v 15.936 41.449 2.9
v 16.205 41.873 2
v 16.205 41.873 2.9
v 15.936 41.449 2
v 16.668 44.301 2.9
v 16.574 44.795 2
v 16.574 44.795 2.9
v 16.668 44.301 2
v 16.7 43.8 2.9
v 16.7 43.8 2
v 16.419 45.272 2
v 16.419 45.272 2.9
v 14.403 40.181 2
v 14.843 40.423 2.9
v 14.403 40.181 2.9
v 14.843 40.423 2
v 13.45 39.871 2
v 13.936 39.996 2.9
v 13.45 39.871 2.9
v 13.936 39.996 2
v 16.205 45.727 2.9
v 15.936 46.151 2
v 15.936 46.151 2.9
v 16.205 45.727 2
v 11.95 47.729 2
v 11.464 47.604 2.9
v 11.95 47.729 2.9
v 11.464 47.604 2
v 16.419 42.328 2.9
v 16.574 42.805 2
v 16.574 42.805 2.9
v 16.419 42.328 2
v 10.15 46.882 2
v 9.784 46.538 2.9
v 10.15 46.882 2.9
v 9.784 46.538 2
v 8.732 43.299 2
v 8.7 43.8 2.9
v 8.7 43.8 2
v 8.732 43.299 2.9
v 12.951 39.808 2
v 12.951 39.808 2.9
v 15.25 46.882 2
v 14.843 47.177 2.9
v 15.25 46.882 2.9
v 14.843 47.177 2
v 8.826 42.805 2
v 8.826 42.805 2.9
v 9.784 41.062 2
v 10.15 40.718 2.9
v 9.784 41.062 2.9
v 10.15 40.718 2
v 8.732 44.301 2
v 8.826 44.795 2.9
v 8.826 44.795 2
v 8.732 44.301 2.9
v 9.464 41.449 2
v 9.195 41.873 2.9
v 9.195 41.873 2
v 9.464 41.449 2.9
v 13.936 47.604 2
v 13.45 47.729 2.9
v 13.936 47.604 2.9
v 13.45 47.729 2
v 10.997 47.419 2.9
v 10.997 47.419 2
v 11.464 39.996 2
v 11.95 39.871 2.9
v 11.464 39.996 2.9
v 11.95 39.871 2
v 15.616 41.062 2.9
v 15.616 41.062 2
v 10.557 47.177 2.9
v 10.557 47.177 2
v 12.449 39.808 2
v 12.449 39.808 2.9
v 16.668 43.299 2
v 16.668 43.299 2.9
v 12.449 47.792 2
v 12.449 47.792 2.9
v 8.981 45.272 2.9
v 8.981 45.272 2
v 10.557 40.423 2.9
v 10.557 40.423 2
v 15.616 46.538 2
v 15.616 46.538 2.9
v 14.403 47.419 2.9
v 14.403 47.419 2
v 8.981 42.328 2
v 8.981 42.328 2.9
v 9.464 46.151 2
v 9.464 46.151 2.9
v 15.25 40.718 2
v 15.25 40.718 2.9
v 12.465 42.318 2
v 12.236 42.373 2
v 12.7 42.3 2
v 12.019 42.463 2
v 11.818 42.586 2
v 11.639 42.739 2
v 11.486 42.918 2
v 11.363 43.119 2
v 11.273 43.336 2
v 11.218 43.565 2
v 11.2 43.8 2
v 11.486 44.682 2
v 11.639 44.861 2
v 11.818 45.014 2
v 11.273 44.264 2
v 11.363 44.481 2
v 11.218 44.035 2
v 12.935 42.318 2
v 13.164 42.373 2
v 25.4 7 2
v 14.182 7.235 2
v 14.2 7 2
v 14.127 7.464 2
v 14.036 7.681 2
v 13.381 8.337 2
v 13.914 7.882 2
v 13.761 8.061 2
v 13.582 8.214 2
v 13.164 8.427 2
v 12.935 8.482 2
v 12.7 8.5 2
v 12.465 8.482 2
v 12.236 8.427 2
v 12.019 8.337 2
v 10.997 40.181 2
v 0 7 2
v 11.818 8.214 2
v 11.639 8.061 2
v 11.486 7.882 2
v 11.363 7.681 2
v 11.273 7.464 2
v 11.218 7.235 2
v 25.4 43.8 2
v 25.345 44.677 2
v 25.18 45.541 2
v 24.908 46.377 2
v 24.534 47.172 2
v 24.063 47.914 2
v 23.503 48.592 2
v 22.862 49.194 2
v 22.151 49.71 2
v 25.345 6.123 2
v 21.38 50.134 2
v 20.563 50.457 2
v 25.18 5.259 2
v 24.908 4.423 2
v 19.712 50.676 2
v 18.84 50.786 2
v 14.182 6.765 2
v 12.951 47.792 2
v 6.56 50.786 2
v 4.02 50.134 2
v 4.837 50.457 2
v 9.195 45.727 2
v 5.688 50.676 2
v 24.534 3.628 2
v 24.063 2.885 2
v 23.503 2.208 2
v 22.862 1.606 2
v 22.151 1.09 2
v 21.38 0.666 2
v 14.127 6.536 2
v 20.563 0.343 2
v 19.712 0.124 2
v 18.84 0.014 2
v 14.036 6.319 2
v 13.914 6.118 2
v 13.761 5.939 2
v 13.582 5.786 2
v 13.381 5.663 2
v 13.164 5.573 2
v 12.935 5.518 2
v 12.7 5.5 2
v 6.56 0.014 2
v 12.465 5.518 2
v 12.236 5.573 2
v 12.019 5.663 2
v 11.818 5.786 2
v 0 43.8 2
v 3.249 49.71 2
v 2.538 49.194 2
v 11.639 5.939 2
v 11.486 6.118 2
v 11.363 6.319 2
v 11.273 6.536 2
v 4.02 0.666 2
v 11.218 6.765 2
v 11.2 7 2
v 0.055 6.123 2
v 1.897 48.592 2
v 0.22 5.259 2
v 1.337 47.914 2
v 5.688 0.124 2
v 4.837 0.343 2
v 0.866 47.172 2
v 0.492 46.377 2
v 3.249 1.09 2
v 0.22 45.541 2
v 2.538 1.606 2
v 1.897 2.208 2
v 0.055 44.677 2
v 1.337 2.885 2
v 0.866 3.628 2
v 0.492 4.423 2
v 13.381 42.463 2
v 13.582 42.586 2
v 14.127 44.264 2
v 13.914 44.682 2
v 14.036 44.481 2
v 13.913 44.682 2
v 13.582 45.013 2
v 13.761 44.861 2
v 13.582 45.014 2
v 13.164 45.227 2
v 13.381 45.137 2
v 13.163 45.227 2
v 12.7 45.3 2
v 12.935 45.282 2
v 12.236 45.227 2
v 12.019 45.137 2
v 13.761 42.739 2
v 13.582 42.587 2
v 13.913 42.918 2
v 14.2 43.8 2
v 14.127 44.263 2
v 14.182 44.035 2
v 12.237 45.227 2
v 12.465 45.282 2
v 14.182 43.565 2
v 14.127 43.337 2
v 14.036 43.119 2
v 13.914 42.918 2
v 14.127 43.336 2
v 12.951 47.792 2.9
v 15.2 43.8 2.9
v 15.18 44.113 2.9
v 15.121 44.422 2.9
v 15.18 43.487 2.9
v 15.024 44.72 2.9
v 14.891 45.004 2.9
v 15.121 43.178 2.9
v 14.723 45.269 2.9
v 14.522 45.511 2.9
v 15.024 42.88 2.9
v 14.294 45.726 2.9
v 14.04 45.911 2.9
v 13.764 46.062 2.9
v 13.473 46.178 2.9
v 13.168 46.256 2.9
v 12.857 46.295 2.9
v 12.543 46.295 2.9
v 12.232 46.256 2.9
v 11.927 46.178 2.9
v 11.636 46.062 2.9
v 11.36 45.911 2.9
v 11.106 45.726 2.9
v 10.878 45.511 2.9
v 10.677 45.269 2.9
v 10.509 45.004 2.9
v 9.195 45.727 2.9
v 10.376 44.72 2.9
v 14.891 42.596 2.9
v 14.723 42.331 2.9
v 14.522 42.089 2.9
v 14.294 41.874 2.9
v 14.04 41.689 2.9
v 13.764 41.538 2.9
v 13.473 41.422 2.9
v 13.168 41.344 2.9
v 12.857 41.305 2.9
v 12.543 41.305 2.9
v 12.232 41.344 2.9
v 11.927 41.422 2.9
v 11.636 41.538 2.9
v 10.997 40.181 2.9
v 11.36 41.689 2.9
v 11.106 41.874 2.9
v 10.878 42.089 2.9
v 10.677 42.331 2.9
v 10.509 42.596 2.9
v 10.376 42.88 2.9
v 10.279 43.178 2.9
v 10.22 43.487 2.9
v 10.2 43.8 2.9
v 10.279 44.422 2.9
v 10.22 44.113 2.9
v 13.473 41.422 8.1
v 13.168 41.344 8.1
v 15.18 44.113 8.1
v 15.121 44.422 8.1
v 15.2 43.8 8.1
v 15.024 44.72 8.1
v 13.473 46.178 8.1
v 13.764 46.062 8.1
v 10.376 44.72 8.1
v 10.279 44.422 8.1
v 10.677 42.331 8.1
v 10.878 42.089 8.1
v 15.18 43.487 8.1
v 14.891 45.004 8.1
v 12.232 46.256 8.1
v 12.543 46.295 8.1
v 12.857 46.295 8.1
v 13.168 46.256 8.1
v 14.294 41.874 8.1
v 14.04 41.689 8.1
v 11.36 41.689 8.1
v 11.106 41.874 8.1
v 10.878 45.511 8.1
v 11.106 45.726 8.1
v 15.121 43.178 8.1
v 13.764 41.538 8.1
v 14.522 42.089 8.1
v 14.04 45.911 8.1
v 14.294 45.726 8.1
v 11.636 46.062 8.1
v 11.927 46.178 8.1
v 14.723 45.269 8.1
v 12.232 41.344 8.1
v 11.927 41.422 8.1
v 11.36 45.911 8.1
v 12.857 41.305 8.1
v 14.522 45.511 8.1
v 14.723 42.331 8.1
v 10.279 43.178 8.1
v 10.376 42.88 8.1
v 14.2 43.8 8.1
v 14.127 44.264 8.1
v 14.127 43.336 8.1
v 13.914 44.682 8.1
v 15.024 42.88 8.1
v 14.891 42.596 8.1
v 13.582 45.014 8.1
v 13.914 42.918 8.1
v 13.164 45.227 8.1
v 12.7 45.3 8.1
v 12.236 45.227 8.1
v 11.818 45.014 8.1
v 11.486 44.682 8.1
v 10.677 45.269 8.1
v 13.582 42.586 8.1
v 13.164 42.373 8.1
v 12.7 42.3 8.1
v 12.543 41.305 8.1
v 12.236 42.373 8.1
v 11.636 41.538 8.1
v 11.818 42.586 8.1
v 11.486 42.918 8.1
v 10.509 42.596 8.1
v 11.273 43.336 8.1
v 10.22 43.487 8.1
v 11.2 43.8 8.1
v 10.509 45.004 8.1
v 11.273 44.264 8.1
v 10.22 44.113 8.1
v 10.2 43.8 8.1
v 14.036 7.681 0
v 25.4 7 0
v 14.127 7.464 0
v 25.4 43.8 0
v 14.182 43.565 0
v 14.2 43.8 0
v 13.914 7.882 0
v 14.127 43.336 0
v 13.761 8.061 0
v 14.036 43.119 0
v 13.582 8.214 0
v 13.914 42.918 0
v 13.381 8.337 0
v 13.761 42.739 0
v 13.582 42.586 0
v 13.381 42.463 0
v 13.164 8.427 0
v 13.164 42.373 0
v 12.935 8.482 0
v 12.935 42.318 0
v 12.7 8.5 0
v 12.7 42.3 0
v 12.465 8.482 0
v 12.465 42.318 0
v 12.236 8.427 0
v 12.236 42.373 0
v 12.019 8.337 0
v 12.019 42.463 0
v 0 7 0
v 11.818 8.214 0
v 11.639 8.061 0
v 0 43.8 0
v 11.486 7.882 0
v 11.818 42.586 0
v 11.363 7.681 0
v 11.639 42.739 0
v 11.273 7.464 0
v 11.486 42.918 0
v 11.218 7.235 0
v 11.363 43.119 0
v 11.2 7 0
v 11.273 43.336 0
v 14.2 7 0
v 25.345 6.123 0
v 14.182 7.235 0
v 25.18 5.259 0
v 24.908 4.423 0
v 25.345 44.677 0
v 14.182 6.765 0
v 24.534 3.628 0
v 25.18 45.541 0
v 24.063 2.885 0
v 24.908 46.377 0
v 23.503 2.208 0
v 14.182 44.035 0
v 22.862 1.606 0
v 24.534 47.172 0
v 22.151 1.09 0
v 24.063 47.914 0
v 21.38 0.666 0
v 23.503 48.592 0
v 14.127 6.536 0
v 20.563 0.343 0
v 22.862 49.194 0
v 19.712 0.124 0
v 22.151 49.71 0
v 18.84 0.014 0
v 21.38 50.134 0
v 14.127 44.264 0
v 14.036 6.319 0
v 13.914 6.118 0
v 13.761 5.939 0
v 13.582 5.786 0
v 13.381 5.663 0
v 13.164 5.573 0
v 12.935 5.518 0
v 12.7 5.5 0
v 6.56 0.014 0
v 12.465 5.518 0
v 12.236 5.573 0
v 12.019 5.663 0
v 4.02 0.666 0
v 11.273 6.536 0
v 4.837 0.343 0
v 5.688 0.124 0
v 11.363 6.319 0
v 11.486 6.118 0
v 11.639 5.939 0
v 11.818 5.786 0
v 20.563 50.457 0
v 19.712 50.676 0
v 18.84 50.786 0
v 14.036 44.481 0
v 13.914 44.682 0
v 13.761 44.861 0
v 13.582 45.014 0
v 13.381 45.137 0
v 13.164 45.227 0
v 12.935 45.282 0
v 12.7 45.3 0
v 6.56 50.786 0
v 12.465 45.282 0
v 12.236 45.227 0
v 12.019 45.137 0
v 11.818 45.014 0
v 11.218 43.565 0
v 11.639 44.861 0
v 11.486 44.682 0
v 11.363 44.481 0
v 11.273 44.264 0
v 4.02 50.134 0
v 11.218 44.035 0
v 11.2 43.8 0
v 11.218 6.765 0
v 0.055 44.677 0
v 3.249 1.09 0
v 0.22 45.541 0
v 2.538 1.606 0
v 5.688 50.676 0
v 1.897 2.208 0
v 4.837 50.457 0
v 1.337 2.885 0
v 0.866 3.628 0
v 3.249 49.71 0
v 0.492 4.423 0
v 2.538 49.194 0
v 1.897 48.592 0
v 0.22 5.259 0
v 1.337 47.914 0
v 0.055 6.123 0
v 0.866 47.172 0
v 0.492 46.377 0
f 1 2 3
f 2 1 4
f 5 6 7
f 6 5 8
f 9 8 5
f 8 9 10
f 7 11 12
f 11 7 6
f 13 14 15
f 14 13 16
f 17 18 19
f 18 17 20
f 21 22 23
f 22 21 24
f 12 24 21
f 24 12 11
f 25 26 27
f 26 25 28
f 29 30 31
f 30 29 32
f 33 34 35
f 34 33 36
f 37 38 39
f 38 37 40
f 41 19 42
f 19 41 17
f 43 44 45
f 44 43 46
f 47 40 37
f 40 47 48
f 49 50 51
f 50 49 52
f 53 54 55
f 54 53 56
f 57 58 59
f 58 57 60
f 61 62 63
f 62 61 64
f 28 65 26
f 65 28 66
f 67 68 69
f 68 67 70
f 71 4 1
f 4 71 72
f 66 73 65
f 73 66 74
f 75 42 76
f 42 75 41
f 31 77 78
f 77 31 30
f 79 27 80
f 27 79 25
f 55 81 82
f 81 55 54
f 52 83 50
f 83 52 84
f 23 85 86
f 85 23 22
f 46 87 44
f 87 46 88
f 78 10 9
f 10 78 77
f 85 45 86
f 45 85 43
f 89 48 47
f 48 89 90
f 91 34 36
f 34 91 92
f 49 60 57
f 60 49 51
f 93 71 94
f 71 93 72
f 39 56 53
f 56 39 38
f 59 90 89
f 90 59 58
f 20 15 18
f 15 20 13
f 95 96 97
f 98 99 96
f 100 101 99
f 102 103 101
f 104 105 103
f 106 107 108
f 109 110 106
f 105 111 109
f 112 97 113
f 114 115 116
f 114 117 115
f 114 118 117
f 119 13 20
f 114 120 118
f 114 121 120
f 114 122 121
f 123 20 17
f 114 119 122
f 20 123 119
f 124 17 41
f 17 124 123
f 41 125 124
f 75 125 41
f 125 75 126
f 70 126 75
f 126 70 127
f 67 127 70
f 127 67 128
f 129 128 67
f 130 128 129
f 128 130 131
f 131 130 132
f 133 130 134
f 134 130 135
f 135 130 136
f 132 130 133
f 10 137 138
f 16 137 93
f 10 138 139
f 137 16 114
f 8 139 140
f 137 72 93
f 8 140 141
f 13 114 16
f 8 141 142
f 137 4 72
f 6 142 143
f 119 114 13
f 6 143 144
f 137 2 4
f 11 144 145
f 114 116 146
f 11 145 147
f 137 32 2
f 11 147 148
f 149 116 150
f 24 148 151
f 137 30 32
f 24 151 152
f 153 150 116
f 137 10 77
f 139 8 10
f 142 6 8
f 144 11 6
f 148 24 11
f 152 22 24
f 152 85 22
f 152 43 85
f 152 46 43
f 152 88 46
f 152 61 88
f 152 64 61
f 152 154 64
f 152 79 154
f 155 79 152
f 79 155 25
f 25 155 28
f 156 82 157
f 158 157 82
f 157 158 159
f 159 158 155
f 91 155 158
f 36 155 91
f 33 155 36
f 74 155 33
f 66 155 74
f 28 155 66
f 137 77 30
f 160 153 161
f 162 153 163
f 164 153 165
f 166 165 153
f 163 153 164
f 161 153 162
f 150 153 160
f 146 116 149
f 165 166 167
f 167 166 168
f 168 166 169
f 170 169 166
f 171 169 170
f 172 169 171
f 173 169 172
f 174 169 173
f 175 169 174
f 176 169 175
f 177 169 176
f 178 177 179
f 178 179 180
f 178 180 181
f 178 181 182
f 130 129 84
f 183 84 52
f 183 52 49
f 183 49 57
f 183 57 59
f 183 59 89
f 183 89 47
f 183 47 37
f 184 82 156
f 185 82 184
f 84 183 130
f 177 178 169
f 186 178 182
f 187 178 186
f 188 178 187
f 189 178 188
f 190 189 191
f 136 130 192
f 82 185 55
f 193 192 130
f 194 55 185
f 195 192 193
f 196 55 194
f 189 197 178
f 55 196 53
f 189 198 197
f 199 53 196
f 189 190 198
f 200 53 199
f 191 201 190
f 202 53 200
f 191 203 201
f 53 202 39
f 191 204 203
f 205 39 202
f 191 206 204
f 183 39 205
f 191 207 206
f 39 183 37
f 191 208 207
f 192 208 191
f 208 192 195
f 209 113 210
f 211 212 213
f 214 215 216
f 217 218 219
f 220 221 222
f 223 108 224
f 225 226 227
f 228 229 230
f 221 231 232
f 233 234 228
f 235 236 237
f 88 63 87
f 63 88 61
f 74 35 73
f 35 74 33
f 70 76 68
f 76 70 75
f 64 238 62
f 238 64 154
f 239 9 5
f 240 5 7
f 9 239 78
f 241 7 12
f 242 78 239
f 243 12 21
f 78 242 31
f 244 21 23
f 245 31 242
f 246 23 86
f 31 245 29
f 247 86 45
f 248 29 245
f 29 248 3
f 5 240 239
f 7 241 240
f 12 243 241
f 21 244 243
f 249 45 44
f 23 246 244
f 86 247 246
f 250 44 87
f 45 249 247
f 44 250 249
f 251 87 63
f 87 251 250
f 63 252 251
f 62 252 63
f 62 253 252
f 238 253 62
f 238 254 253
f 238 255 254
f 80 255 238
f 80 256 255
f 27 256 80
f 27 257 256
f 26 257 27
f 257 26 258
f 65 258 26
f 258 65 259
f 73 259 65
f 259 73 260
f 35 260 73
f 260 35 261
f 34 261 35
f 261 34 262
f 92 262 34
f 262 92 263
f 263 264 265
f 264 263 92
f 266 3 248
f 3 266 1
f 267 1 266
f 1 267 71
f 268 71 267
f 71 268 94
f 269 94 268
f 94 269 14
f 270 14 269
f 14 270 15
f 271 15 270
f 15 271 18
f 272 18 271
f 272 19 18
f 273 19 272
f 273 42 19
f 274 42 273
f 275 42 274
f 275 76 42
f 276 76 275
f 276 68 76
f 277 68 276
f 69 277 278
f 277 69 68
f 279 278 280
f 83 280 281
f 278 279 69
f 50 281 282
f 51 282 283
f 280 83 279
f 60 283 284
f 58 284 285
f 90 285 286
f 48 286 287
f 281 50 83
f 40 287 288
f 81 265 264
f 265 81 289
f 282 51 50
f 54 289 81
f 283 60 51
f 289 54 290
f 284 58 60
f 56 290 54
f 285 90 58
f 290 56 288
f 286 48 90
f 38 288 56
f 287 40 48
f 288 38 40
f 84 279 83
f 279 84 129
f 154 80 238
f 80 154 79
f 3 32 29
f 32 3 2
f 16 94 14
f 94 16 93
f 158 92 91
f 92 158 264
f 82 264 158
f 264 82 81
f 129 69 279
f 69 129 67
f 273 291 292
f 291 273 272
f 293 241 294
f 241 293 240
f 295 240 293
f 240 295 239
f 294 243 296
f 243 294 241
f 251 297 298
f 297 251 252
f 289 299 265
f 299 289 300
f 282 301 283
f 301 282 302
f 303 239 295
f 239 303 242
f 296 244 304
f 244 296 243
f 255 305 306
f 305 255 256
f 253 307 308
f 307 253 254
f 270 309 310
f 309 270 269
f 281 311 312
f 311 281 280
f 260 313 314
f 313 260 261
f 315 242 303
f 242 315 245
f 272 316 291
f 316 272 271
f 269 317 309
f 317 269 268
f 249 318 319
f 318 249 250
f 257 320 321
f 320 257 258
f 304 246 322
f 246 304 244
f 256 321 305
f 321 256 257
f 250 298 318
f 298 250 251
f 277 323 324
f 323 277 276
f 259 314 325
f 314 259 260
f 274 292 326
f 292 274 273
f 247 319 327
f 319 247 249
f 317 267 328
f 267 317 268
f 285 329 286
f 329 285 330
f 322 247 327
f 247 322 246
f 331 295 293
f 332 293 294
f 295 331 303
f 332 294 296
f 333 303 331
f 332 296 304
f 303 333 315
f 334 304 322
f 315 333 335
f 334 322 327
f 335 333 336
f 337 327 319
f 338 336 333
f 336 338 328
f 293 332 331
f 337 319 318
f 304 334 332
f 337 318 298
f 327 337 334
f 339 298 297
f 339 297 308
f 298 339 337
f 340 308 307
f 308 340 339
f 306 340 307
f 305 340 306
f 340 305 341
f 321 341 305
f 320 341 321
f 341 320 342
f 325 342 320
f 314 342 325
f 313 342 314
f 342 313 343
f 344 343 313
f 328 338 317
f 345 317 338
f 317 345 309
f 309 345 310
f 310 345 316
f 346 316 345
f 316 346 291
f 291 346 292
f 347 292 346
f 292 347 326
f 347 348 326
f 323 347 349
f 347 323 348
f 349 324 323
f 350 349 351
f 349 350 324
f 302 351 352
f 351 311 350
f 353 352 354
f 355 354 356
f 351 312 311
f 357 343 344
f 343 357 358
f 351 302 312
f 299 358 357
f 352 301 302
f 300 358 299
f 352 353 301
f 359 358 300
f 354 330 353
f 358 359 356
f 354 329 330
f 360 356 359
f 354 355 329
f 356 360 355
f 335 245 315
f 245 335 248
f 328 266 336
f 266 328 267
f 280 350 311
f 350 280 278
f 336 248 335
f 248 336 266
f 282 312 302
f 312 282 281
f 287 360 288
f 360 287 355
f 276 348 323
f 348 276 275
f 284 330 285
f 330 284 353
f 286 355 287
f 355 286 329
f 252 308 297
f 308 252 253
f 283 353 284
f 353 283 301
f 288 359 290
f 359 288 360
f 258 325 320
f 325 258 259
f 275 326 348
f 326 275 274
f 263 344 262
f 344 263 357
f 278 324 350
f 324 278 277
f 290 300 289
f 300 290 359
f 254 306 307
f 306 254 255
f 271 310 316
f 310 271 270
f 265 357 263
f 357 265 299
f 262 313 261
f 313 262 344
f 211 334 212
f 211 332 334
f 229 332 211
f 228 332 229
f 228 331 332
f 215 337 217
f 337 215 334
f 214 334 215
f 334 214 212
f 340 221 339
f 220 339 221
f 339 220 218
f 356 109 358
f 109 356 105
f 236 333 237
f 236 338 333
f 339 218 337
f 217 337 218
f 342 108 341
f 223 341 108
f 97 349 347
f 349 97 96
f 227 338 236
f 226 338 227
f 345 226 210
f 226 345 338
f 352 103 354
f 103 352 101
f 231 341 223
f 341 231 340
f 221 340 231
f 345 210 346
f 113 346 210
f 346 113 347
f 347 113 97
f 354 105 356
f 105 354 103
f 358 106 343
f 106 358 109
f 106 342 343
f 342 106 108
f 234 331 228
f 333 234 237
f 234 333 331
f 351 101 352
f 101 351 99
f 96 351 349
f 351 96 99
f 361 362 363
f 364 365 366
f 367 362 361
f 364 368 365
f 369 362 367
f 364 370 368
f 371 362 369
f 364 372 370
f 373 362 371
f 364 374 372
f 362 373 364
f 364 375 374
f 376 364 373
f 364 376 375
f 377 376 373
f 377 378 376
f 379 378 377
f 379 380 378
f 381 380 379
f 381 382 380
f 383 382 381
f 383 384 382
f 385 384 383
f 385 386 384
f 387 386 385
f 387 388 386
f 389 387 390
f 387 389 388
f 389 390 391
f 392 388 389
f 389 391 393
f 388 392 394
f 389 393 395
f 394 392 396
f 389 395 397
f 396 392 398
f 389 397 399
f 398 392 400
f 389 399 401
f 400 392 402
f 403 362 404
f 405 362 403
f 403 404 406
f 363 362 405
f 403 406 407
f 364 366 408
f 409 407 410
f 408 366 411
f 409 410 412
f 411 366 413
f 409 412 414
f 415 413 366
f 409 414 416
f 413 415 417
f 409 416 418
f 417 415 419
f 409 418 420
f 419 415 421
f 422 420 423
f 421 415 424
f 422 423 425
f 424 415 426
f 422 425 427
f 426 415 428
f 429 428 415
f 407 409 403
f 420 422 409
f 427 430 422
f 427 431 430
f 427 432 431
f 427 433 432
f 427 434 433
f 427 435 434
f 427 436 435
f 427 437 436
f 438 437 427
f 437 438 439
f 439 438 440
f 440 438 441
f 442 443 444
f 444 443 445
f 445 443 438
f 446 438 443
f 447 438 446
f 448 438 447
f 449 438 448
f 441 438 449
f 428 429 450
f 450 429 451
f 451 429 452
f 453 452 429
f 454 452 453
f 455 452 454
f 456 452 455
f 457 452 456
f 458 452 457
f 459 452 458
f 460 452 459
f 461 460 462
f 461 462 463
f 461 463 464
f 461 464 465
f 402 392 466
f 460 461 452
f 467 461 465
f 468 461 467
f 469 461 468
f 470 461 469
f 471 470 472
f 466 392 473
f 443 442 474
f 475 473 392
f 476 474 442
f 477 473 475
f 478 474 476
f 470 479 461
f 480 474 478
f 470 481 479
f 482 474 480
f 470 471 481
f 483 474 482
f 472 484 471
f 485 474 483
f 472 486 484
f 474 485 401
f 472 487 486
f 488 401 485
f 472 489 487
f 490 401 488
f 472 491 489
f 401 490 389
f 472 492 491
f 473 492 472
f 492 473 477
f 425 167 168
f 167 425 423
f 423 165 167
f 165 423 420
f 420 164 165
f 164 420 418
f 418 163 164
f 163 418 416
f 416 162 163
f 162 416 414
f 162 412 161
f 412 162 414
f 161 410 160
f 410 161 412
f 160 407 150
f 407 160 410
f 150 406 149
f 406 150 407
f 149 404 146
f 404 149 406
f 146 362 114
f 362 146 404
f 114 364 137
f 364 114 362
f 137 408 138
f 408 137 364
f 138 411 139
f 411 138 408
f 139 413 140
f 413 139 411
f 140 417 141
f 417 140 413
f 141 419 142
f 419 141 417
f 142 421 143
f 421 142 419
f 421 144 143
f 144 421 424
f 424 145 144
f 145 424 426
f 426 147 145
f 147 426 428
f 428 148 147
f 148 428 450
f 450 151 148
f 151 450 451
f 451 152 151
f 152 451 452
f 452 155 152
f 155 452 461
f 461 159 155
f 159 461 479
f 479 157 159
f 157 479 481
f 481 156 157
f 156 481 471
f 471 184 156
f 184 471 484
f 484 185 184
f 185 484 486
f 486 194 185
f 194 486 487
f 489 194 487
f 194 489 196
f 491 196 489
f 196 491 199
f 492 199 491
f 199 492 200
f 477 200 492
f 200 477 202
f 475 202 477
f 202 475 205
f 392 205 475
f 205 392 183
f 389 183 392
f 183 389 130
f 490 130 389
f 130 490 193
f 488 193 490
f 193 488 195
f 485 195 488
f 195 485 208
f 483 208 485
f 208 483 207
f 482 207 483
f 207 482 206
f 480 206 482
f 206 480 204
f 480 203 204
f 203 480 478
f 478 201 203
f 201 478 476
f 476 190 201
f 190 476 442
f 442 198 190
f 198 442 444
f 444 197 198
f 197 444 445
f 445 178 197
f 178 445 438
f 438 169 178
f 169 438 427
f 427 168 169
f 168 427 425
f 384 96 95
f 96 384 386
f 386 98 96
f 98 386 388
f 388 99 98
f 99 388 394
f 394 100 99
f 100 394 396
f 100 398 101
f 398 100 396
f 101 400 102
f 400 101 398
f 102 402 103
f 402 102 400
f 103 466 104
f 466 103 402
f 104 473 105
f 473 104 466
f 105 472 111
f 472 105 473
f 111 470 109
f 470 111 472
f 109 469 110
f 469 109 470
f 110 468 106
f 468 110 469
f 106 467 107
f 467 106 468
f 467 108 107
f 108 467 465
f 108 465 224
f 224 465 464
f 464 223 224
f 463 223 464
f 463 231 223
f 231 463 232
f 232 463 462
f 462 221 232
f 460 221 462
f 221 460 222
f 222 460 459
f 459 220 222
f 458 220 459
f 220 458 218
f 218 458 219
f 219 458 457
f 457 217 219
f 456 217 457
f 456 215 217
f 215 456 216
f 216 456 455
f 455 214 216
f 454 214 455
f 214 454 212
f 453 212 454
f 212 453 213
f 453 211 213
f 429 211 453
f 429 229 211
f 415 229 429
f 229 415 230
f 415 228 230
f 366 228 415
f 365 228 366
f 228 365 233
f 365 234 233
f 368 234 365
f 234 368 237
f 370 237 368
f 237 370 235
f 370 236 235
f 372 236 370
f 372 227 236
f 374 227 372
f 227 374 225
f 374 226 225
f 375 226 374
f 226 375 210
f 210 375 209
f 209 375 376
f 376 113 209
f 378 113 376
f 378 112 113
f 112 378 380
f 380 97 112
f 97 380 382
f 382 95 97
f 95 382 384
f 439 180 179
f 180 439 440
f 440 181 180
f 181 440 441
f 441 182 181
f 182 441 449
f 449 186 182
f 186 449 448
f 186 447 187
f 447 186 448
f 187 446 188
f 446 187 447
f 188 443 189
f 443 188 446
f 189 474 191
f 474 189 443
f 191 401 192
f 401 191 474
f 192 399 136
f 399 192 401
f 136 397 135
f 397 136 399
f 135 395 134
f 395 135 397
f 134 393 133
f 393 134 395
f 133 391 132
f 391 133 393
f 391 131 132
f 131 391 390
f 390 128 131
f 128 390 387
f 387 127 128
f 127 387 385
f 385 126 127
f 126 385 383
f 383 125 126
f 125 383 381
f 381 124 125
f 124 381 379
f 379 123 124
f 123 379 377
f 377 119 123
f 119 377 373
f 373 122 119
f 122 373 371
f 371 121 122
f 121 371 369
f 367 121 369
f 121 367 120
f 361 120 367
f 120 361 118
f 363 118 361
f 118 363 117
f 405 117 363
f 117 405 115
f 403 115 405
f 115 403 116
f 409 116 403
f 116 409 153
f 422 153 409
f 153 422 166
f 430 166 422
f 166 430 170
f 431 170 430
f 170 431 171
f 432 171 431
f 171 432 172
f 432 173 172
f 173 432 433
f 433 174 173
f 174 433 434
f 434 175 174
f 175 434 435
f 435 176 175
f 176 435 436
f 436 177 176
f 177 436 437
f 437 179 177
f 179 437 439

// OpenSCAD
*!difference() {
  cylinder(d1=14,d2=10.4,h=1.8,$fn=50);
  translate([0,0,-.01]) cylinder(d=8,h=10,$fn=50);
}
maxx=inches(1);
maxy=inches(2);
bearod=16;
bearid=5;
beart=5;
bearxo=(bearod-2)/2;
xpos=[maxx/2];
*translate([-20,maxy-22.5,-12.5]) difference() {
  cube([99,25.4,25.4]);
  translate([-.5,1,1]) cube([100,23,23]);
}
translate([maxx/2,0]) for(m=[0]) rotate([0,m*180,0]) translate([maxx/-2,0]) {
  linear_extrude(2) difference() {
  hull() {
    for(x=[bearxo,maxx-bearxo],y=[bearxo,maxy-bearxo]) translate([x,y]) circle(r=bearxo,$fn=50);
  }
  for(x=xpos,y=[bearxo,maxy-bearxo])
  translate([x,y]) circle(d=3,$fn=40);
}
for(x=xpos) translate([x,maxy-bearxo,2]) difference() {
  union() {
    cylinder(d=bearid+3,h=.9,$fn=50);
    cylinder(d=bearid,h=1.1+beart,$fn=50);
  }
  translate([0,0,-.1]) cylinder(d=3,h=20,$fn=20);
  if(beart>5)
  {
    if(x>maxx/2) translate([0,0,6]) cylinder(d=5,h=3,$fn=40);
    else translate([0,0,6]) cylinder(d=7.1,h=3,$fn=6);
  }
}
}
for(x=xpos,z=[2.9,-10])
%translate([x,maxy-bearxo,z]) linear_extrude(beart) difference() { circle(d=bearod,$fn=50); circle(d=bearid,$fn=40); }

function inches(mm) = mm*25.4;
